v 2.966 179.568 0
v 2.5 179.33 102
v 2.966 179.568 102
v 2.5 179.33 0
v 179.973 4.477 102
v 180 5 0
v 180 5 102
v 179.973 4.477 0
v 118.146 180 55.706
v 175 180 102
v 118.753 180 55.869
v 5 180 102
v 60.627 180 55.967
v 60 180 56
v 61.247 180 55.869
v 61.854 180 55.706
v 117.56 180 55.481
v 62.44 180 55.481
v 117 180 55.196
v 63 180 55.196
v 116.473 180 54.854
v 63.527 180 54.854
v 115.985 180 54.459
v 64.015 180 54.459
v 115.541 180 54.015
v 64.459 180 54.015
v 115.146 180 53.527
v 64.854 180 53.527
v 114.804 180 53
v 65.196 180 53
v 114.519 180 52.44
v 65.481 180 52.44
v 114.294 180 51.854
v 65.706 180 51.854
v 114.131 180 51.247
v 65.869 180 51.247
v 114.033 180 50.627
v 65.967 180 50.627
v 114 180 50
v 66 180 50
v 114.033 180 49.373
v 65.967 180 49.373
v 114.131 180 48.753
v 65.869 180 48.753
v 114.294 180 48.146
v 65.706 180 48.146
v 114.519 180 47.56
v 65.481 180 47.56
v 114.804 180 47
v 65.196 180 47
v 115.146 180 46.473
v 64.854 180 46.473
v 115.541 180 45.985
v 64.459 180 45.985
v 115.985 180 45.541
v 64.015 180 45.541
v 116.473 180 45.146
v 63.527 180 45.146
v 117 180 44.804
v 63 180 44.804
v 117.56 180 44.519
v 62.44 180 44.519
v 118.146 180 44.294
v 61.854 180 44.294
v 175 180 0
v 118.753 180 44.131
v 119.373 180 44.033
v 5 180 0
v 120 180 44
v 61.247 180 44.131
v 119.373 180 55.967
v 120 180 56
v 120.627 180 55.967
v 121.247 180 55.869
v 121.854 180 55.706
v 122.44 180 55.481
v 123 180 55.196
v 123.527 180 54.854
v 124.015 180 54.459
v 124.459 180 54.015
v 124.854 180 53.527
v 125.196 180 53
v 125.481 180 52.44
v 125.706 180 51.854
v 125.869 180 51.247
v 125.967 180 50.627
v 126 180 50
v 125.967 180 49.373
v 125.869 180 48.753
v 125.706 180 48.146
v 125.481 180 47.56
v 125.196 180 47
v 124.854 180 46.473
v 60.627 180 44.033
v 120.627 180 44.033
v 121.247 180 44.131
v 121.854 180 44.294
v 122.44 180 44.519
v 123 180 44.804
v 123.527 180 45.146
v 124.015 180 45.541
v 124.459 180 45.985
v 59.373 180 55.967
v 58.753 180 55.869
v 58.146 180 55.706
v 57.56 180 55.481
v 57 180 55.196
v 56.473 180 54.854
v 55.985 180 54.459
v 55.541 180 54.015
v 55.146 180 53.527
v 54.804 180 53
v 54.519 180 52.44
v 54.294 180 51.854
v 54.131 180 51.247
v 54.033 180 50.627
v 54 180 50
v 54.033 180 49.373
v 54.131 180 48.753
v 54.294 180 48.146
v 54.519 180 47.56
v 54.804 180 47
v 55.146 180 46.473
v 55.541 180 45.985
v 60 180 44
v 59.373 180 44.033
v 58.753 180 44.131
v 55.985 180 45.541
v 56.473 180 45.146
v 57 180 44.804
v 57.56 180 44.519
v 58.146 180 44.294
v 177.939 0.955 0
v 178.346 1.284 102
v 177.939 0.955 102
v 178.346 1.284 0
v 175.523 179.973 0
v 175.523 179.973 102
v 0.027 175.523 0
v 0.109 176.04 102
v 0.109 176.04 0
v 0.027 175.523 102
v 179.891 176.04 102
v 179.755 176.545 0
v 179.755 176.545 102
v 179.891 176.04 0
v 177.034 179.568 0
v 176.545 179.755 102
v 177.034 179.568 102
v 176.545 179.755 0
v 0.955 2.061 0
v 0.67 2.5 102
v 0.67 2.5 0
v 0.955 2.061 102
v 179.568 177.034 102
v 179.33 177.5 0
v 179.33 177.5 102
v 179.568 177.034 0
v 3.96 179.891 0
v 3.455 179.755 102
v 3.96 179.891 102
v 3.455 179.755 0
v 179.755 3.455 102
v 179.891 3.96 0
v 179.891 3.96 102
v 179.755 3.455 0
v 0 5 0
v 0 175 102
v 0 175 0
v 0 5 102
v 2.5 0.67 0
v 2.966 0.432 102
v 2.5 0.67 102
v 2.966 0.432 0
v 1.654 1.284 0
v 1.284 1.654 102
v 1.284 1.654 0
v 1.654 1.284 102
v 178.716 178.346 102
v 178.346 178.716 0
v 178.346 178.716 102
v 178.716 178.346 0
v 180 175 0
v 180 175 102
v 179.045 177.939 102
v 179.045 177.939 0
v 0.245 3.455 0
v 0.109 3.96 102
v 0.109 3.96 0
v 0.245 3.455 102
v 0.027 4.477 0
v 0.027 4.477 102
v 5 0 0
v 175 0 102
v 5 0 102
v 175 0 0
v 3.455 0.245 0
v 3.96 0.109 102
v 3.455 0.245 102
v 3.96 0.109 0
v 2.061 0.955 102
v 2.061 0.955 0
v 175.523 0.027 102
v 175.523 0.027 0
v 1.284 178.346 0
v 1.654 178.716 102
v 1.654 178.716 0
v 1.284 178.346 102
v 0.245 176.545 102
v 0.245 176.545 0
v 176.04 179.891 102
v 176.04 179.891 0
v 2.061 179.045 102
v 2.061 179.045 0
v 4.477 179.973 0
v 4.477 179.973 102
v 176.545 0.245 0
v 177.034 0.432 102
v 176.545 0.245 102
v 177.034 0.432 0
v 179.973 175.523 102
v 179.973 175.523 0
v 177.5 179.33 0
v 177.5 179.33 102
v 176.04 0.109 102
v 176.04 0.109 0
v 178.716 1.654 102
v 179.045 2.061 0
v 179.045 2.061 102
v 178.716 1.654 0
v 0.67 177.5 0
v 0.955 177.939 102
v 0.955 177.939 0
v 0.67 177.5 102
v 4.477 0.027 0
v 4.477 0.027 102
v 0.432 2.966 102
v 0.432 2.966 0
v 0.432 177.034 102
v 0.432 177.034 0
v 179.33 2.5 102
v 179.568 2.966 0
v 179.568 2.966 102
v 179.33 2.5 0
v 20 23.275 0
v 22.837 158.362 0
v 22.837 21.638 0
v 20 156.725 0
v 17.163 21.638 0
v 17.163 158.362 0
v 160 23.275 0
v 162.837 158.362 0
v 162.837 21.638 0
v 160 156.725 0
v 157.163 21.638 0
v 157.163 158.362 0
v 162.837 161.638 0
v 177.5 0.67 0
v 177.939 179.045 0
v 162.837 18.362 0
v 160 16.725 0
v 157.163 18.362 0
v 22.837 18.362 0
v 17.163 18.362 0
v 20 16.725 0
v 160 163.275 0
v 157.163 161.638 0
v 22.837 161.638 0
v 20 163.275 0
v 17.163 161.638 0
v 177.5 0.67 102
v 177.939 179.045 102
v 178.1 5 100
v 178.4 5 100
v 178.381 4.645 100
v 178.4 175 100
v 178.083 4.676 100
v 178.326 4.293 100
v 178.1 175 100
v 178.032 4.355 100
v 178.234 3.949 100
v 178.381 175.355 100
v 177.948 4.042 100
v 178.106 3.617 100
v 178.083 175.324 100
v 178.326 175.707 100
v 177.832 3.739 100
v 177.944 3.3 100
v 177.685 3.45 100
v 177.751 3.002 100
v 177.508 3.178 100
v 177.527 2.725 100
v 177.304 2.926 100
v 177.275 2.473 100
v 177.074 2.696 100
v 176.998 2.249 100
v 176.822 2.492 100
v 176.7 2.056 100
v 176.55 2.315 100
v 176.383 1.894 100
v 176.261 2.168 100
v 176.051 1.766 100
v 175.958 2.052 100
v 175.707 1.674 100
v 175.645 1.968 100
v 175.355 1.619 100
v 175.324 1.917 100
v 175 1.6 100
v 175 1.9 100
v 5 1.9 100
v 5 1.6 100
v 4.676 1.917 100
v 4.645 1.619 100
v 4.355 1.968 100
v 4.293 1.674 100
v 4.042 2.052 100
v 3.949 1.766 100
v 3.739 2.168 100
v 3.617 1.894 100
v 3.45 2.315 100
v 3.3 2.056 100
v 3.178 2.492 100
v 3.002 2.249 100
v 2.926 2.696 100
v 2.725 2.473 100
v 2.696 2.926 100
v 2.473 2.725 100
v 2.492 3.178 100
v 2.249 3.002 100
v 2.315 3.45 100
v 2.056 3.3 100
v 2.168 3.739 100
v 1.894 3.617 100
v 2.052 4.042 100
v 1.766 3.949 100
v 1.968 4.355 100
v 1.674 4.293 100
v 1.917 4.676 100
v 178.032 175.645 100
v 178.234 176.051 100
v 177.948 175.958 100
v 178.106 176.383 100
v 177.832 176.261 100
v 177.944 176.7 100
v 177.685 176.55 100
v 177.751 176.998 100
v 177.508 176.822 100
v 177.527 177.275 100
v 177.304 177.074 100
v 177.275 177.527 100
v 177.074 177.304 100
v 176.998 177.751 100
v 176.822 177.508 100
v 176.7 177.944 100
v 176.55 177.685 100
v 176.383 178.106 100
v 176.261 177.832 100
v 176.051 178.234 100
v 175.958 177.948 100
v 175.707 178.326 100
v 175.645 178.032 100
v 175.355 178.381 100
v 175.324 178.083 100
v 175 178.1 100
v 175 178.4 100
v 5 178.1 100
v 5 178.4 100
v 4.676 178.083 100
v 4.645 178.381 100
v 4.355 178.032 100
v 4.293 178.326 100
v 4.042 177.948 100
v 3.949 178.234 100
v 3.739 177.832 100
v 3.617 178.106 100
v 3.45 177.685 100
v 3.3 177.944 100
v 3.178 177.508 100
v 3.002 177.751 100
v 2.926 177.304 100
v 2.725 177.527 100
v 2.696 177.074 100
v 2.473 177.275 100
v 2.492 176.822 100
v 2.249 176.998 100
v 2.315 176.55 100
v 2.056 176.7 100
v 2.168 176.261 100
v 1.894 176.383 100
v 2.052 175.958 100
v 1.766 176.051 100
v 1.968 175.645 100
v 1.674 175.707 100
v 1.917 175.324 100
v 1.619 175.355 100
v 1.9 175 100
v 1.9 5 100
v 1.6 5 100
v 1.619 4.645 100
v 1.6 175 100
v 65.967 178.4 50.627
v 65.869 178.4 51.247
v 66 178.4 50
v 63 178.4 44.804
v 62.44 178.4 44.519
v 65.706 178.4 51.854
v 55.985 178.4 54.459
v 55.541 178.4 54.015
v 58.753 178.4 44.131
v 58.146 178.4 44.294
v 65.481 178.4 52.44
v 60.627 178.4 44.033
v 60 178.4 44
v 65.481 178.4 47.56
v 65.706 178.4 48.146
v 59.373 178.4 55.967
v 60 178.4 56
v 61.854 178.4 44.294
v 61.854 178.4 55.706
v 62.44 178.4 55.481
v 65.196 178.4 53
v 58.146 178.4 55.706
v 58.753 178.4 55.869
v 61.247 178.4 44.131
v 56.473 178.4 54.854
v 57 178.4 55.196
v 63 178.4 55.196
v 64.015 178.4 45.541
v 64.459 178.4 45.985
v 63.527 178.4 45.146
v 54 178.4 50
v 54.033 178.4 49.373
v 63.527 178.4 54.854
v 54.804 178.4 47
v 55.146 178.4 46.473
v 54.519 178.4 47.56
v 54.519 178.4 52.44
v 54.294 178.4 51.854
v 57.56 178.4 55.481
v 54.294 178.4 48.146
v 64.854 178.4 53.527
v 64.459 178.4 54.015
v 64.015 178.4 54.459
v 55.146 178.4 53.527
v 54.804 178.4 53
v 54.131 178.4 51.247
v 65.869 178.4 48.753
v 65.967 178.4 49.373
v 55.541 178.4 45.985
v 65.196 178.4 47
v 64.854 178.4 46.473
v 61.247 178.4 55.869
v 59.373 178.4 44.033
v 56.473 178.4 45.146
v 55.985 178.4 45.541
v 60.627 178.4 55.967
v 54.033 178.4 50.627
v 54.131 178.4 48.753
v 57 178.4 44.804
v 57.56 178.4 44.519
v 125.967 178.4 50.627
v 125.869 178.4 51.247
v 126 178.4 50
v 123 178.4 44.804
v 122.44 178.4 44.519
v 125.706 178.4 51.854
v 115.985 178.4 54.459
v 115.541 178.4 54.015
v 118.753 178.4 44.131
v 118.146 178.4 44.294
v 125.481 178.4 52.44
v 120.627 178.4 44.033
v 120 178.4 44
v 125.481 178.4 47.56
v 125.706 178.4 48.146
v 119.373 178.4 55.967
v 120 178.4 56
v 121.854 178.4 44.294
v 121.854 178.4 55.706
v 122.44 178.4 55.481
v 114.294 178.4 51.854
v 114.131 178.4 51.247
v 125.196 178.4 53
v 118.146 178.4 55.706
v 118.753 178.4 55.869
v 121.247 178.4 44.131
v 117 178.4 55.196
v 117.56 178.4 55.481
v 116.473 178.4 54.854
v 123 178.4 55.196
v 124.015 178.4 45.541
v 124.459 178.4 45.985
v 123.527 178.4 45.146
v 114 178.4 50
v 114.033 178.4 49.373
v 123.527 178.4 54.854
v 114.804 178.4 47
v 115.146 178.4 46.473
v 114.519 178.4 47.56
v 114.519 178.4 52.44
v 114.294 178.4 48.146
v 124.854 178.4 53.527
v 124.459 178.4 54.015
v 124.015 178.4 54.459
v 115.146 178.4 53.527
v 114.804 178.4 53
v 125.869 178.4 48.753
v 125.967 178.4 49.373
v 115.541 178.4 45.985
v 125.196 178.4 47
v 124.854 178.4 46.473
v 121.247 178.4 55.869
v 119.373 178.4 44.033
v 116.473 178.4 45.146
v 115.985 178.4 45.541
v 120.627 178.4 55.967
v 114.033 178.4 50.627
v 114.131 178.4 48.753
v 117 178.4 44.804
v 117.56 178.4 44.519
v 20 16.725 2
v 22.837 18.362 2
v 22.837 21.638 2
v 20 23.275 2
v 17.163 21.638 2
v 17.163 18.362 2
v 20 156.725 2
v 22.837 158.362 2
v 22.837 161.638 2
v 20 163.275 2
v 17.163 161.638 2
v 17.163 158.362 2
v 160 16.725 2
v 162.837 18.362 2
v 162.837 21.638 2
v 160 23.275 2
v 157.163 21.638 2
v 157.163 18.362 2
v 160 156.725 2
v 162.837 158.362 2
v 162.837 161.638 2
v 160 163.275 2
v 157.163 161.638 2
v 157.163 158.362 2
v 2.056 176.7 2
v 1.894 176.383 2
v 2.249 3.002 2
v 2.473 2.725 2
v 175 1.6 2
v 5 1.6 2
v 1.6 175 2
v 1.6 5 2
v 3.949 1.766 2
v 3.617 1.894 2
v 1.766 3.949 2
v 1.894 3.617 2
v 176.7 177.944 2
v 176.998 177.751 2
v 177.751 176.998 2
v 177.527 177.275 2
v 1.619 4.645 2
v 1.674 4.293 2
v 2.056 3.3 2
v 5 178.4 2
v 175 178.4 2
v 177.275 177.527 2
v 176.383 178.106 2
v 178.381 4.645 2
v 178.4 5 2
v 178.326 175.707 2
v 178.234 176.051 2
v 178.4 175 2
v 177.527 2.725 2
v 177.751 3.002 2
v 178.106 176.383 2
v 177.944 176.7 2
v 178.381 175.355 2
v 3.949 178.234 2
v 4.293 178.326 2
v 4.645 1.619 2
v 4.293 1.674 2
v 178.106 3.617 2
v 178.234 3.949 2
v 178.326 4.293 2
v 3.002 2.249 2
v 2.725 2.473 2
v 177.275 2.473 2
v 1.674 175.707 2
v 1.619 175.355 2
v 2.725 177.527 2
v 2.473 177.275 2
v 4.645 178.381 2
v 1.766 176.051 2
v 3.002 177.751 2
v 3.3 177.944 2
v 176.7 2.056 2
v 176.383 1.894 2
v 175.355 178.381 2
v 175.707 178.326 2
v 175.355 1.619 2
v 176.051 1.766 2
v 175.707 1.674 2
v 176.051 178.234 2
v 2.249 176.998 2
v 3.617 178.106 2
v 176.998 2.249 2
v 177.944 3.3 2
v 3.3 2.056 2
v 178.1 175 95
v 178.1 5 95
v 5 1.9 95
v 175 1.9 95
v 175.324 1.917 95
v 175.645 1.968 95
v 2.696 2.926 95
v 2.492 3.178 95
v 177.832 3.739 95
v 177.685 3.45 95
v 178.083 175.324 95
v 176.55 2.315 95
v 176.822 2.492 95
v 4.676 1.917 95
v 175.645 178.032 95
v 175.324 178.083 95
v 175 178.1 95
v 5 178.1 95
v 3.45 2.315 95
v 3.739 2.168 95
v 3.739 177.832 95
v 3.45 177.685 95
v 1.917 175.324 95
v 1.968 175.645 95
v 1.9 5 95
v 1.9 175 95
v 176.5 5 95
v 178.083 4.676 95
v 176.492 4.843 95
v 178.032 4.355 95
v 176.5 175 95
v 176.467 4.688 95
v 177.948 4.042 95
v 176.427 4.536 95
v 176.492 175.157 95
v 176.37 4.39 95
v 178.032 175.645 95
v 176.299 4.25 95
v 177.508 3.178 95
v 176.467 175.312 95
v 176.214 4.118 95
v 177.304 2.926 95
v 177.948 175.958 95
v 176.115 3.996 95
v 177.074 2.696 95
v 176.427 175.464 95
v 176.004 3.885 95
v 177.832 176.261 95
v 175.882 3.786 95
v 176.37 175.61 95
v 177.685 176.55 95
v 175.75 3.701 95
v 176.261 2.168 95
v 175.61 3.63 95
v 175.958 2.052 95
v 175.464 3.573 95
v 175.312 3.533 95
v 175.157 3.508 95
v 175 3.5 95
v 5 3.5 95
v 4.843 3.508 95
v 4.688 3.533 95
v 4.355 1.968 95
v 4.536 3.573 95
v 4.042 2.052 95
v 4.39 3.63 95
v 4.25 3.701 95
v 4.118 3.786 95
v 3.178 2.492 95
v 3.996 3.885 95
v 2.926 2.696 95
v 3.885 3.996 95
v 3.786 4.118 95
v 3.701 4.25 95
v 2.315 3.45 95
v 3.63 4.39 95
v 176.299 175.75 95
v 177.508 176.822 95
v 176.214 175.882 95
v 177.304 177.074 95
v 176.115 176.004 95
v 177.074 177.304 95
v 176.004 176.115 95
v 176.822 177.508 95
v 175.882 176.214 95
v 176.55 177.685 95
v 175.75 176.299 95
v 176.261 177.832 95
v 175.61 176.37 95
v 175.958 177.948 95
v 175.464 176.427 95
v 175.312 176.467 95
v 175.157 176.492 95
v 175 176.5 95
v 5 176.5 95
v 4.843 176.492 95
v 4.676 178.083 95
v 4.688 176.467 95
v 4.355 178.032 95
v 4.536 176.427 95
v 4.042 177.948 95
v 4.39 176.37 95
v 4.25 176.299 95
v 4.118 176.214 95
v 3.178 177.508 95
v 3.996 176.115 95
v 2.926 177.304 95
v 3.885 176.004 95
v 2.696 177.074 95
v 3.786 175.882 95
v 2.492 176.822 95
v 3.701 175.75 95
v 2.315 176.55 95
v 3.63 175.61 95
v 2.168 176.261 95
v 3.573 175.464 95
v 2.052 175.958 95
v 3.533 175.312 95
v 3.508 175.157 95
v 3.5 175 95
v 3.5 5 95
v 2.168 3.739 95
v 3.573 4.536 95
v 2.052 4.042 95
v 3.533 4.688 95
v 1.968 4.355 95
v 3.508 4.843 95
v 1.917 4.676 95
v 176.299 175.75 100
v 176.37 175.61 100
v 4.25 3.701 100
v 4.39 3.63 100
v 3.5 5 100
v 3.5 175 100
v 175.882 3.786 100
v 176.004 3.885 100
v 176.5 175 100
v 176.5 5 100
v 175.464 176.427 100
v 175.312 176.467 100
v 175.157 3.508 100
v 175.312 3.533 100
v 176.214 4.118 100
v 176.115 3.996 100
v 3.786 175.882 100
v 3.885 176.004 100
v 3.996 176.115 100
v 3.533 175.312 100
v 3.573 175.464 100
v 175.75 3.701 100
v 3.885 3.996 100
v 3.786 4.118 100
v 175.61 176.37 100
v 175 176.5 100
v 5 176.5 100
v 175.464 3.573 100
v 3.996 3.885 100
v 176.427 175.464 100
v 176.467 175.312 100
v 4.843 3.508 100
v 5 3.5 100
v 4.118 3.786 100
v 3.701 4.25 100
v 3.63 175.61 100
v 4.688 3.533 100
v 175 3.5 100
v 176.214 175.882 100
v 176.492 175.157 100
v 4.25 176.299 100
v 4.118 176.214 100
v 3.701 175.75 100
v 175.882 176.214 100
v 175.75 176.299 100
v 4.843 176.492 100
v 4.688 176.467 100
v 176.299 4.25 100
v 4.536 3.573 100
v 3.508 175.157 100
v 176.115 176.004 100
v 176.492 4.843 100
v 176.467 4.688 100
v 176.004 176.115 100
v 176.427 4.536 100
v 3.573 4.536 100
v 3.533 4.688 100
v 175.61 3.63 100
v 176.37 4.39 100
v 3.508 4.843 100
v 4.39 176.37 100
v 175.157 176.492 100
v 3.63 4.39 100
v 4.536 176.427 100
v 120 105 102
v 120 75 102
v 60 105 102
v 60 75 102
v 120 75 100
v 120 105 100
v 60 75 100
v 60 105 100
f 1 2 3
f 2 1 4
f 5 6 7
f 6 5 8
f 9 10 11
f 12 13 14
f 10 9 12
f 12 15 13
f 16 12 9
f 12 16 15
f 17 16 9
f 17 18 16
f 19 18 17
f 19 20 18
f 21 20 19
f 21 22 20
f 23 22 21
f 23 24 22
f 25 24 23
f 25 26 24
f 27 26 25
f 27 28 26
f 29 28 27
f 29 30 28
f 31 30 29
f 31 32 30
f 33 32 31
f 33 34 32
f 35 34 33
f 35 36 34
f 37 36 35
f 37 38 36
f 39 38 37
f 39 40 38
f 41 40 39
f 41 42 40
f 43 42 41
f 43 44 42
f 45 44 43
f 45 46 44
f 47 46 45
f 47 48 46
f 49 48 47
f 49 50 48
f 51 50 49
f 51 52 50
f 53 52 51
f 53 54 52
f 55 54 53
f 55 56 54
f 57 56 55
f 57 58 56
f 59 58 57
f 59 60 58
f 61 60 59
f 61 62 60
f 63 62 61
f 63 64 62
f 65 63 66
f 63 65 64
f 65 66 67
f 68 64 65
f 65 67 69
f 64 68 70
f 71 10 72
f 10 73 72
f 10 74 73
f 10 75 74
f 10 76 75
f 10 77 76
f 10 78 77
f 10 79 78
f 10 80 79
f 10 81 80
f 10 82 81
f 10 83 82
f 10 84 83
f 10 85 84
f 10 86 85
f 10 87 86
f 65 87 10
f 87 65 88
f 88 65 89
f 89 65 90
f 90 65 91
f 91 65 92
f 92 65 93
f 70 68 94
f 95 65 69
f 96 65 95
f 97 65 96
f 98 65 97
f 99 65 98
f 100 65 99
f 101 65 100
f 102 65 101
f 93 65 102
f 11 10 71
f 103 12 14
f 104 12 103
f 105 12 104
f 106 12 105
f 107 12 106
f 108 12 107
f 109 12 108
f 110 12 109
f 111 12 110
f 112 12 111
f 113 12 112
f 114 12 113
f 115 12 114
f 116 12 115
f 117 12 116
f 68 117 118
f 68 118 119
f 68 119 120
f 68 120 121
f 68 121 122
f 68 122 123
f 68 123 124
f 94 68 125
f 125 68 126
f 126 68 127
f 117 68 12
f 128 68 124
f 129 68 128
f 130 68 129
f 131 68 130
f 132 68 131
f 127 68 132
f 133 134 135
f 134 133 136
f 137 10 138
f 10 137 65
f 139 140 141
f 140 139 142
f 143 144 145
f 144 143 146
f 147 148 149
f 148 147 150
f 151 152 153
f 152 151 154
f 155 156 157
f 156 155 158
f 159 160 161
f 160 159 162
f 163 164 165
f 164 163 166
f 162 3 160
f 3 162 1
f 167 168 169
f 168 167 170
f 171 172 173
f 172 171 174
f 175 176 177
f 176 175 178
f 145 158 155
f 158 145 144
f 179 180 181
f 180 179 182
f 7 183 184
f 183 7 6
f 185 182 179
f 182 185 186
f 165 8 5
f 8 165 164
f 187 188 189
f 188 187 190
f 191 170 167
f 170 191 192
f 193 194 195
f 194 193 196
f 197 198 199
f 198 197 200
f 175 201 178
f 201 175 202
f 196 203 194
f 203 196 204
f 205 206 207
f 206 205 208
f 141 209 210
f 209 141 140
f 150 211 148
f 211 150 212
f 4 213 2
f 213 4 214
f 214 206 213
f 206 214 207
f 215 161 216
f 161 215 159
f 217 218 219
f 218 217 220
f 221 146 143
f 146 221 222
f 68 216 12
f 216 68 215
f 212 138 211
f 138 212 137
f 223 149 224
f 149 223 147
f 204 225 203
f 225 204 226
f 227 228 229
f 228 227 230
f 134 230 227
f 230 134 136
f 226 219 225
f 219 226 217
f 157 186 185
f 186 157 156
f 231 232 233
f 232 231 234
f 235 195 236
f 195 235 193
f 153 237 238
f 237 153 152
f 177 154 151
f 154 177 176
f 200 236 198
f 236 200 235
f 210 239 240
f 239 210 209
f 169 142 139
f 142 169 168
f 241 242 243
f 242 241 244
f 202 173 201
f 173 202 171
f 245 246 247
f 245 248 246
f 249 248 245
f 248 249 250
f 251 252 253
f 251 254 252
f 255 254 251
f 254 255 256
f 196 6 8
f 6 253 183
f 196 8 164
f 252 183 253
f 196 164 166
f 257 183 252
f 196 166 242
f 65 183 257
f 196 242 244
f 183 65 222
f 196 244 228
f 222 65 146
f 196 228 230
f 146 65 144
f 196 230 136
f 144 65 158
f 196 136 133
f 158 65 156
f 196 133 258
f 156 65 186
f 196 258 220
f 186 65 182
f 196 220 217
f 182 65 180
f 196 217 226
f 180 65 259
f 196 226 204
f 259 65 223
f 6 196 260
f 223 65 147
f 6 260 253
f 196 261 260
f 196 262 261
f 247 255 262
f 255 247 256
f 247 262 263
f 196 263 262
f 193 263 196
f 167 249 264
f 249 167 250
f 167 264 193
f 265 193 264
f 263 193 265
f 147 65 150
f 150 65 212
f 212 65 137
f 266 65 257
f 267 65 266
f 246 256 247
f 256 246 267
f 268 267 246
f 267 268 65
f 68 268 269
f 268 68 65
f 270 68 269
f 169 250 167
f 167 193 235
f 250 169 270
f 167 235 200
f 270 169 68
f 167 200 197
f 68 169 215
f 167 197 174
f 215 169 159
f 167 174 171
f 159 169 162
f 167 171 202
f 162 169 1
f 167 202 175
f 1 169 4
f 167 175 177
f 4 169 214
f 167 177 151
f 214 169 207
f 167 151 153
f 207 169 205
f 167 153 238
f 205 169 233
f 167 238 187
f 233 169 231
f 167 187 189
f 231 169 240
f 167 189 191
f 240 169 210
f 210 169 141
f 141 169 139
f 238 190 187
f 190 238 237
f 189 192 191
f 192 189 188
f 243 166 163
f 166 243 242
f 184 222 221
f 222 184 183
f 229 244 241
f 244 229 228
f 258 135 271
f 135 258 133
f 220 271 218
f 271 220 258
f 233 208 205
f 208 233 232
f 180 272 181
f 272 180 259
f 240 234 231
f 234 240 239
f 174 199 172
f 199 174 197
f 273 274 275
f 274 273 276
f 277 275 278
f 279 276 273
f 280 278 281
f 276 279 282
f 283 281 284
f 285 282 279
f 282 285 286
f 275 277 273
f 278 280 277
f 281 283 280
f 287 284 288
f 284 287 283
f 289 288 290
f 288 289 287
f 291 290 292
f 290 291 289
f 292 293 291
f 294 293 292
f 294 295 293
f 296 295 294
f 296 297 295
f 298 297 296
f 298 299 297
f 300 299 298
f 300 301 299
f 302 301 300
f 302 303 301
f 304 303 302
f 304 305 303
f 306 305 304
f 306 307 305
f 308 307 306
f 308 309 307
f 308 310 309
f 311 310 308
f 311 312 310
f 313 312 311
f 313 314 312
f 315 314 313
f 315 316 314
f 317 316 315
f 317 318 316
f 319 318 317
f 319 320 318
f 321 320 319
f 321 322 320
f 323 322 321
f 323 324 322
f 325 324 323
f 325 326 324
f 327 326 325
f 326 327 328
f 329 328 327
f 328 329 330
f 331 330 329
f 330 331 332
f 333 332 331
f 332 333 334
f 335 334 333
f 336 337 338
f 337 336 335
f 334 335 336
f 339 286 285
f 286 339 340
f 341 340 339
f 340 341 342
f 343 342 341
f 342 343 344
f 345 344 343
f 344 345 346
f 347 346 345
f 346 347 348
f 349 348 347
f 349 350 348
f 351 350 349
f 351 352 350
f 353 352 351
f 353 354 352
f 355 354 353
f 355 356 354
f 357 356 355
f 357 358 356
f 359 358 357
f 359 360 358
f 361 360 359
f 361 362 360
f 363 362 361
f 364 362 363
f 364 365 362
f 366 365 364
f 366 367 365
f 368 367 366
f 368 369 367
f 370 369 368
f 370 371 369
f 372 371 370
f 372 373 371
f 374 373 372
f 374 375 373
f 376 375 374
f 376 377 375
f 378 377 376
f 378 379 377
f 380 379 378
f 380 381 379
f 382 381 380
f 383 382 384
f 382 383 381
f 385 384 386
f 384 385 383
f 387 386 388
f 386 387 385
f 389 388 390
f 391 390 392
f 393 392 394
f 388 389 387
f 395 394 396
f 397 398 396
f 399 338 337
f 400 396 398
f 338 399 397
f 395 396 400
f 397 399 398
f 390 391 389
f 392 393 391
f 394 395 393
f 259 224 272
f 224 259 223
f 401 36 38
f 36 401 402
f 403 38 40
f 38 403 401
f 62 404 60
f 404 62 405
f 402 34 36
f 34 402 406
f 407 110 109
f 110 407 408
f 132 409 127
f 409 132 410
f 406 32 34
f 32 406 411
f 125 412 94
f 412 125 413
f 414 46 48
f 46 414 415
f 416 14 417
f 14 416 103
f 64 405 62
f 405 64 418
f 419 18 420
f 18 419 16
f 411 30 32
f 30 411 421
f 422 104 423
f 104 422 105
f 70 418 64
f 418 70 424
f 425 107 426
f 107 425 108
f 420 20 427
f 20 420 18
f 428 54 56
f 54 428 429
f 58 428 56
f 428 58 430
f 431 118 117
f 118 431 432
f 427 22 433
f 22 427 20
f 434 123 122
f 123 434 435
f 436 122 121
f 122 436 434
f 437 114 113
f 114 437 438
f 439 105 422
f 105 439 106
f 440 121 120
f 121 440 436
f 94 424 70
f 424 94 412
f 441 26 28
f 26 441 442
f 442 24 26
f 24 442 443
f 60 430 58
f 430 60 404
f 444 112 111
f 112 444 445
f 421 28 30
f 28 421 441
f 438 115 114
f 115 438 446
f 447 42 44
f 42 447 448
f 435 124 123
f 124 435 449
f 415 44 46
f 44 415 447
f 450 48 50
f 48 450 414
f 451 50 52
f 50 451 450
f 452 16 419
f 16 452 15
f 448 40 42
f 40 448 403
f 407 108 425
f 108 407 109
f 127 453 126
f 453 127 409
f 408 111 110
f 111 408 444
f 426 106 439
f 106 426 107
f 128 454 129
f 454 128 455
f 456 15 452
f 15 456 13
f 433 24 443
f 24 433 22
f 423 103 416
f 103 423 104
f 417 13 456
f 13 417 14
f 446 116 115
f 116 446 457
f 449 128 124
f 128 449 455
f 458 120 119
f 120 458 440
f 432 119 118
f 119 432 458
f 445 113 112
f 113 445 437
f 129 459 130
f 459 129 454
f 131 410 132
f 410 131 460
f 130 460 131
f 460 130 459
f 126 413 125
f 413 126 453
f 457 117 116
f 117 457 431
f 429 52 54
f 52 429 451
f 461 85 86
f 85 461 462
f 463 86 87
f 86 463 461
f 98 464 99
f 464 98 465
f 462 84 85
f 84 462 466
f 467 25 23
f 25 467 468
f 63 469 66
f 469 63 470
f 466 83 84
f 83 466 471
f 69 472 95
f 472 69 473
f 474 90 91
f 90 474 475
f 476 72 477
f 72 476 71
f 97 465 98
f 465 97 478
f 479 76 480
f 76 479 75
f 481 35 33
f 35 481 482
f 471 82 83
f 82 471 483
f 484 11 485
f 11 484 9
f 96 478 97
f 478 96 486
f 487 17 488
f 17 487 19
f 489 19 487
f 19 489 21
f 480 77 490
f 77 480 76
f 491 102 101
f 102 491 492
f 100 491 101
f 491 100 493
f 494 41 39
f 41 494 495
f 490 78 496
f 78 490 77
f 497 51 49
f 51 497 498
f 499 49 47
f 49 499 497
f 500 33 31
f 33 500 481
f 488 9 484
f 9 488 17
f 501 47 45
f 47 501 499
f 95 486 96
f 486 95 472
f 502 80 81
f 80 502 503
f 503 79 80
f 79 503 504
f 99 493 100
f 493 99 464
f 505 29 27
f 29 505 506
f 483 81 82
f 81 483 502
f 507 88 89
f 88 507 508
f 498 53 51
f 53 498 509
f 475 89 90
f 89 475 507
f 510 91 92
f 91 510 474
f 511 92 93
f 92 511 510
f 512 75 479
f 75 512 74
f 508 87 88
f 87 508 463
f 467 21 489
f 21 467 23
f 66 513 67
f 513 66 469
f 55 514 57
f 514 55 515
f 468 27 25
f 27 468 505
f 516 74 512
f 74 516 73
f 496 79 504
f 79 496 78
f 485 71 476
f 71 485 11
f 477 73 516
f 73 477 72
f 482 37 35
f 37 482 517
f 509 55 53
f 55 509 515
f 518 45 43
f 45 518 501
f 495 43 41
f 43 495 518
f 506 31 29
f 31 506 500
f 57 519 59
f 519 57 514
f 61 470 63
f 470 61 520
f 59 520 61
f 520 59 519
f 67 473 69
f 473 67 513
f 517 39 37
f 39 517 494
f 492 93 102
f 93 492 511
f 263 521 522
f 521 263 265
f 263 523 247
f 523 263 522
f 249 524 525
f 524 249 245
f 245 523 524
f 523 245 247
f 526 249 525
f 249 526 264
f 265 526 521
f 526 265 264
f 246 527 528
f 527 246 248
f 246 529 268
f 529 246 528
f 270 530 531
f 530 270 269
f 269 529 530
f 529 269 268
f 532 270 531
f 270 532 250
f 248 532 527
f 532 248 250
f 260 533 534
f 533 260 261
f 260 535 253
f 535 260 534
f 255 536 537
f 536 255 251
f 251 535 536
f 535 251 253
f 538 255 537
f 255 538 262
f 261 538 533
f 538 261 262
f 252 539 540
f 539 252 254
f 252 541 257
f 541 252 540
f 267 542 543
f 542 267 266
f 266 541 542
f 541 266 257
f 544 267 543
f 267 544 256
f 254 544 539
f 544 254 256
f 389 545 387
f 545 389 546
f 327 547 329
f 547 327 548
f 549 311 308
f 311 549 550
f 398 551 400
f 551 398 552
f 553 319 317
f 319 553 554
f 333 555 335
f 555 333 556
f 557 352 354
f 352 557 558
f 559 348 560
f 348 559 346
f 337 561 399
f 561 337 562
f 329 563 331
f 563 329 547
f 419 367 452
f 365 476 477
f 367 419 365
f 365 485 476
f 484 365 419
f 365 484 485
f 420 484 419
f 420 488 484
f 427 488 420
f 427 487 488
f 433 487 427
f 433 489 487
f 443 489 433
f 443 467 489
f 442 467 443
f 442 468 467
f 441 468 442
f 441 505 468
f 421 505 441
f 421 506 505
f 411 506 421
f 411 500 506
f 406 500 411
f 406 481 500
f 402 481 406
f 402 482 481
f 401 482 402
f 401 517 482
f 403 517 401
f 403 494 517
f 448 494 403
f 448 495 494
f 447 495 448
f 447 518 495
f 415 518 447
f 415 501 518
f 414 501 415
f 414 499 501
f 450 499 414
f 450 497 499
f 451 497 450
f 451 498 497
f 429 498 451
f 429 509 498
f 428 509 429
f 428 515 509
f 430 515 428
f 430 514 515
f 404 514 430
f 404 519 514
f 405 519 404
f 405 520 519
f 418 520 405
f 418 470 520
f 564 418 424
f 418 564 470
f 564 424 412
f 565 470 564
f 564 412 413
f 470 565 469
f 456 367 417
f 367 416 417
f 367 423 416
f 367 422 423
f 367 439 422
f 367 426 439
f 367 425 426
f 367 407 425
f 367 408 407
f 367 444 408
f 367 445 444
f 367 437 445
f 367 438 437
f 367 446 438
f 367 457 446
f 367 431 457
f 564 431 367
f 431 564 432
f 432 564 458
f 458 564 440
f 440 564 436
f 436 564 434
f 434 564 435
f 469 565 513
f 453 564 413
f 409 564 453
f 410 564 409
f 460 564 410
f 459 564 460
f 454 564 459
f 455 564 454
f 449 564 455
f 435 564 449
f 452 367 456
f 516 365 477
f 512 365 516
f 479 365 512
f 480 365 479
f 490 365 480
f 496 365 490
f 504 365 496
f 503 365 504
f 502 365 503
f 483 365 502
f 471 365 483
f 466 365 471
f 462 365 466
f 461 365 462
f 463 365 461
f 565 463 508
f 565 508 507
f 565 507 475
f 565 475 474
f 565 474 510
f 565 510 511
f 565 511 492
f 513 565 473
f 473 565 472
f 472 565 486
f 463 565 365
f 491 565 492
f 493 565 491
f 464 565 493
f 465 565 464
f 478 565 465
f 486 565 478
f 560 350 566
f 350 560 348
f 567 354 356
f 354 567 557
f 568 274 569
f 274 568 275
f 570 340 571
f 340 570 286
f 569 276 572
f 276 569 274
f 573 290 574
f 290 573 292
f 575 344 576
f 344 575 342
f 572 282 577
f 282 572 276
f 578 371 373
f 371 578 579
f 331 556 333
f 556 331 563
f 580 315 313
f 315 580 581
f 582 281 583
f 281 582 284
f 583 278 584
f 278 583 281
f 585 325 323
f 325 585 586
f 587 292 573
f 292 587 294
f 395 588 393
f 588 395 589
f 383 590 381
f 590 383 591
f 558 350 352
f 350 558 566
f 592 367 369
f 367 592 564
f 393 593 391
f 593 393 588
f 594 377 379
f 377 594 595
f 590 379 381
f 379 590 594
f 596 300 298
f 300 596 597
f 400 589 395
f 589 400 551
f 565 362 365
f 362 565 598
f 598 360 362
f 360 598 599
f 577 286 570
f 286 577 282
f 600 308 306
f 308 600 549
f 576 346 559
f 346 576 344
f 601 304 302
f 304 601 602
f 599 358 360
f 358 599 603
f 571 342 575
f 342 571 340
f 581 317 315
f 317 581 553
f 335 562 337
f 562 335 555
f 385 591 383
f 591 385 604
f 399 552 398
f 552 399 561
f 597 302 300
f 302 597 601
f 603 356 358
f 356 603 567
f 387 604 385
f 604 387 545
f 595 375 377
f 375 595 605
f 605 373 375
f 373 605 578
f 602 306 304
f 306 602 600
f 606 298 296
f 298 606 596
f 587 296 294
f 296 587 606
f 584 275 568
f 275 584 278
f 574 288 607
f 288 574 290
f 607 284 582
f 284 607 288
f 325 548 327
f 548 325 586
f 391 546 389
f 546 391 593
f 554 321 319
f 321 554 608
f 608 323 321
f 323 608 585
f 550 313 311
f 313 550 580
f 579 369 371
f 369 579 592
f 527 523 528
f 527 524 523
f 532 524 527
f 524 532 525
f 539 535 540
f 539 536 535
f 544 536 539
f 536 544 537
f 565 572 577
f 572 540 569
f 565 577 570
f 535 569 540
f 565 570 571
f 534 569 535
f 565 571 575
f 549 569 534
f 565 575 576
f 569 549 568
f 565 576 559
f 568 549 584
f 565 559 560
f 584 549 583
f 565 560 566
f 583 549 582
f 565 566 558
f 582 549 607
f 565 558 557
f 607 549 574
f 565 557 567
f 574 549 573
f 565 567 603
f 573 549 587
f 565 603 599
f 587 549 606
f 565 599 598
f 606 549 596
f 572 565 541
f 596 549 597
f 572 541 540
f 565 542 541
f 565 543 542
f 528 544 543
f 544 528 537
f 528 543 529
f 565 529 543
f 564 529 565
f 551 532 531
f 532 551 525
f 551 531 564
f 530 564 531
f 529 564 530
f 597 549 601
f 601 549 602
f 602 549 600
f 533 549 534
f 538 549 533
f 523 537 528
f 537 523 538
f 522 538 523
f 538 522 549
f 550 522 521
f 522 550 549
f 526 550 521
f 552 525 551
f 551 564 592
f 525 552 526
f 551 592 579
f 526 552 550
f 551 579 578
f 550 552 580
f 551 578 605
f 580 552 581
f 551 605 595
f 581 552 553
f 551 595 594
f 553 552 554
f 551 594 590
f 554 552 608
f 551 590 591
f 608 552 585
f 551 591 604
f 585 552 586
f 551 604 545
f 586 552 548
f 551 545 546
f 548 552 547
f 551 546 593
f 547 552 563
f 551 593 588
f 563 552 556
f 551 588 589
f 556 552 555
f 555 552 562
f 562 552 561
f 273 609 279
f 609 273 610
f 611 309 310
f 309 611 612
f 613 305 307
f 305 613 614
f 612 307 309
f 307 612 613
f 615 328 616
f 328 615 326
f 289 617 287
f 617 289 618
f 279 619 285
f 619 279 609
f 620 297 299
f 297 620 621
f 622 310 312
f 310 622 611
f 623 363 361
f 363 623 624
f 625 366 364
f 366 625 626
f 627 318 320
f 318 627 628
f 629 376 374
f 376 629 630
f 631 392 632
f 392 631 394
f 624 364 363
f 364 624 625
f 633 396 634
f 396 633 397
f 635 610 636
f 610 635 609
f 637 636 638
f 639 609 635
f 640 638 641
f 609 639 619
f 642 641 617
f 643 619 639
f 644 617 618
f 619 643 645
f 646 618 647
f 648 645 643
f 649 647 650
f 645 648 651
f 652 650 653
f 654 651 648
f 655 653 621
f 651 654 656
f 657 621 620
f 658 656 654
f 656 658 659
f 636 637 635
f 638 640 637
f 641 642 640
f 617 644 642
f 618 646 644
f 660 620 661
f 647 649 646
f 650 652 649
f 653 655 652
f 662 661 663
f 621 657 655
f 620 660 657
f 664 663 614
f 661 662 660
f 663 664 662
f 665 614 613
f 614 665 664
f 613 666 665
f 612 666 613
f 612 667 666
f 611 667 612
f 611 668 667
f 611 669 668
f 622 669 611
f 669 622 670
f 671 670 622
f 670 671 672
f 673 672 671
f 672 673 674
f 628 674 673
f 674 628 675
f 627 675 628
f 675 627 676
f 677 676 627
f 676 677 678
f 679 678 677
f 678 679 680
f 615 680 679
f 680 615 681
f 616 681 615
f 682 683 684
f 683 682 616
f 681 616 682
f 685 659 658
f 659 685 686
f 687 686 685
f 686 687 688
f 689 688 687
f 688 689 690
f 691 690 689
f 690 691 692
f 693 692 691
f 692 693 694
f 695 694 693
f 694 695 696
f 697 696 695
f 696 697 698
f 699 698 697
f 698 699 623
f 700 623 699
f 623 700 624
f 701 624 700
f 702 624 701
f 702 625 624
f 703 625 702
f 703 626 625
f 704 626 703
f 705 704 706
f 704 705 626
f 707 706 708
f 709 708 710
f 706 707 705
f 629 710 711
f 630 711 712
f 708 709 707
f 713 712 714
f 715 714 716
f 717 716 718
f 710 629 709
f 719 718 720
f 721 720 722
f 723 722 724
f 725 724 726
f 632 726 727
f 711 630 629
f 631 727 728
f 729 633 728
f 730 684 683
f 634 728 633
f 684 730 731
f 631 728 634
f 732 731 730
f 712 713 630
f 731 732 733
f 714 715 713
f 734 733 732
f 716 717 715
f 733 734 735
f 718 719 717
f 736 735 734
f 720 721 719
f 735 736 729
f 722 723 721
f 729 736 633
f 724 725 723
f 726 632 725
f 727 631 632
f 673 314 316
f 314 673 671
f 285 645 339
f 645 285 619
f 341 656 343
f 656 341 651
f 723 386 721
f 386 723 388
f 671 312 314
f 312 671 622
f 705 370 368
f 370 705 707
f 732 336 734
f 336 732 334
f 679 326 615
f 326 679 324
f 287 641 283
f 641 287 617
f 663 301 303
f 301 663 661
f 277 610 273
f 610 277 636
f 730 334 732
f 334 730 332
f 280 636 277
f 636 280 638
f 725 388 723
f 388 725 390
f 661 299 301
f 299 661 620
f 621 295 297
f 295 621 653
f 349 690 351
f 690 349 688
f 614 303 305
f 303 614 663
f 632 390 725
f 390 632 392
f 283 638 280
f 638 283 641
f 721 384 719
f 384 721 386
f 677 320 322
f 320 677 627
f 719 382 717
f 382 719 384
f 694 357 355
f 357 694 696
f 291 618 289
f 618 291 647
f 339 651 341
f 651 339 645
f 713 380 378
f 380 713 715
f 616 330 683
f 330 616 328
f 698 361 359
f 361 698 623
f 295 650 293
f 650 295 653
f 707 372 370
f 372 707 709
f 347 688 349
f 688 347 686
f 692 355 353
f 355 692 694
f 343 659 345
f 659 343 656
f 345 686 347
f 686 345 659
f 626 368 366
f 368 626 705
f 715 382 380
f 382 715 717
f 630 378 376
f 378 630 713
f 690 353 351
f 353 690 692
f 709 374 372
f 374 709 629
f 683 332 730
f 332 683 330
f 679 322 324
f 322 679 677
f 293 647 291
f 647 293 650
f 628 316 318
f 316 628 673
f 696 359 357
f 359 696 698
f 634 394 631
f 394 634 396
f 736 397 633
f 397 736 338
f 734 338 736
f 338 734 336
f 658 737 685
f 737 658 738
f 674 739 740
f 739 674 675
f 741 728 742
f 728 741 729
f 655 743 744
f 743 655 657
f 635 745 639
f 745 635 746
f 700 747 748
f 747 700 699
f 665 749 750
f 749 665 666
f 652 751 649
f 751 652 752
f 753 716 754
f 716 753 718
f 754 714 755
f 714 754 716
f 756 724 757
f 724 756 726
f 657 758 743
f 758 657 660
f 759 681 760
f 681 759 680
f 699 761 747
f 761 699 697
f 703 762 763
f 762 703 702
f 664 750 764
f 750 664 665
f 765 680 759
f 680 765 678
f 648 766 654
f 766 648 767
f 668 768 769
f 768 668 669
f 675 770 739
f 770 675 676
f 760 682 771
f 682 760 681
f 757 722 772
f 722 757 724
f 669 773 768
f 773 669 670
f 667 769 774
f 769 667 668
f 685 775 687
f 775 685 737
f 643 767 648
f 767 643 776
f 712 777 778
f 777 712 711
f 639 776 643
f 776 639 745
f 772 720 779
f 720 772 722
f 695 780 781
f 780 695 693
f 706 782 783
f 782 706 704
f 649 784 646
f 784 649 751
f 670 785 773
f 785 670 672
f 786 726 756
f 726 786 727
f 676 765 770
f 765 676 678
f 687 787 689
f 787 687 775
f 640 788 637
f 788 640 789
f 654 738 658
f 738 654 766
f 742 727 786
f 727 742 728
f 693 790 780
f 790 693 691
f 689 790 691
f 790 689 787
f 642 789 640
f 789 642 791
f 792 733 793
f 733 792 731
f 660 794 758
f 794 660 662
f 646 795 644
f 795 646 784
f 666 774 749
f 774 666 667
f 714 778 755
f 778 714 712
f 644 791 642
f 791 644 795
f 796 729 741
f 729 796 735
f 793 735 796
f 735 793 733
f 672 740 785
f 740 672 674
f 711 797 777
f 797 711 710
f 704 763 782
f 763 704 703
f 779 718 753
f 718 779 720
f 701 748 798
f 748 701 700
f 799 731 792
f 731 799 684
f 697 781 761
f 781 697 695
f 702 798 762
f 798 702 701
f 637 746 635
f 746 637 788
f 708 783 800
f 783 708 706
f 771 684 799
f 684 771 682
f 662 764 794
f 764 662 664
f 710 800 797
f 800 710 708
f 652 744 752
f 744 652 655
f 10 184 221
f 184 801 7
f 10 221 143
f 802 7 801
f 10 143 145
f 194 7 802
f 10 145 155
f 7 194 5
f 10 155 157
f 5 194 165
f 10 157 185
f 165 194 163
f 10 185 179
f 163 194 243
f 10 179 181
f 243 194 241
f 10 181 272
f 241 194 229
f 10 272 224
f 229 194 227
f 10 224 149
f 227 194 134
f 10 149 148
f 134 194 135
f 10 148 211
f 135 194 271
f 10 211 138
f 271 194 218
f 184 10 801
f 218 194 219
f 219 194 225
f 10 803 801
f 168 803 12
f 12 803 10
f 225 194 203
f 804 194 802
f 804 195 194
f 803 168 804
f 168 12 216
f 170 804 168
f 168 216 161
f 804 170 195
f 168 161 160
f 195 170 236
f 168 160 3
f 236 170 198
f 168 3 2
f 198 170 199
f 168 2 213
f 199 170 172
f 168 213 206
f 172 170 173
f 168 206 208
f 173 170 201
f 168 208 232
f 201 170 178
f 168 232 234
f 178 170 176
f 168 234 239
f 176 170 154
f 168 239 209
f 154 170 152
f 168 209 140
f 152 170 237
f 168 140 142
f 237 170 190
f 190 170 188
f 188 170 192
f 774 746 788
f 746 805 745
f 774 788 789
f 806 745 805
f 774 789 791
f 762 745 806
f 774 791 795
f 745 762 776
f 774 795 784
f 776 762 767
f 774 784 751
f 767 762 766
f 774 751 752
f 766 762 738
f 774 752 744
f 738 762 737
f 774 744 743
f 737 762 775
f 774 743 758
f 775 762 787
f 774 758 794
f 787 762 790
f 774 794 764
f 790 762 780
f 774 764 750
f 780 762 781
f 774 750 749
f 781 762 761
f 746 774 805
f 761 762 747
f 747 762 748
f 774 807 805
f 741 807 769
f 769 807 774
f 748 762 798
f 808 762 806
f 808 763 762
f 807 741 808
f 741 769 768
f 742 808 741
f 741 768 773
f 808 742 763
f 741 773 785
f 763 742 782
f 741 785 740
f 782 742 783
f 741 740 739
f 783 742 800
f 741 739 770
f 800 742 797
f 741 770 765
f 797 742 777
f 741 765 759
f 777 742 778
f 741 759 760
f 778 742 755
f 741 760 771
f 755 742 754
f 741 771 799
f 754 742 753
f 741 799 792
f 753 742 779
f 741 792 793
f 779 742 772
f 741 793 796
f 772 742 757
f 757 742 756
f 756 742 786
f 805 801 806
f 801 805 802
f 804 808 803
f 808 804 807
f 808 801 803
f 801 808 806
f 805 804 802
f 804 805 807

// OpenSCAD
// file: params.scad
// ============================================
// fiberfeel-rig 共通パラメータ
// ============================================

// --- ファイバー ---
// 三菱レイヨン エスカ CK-40E1 (PMMA SI POF, 1.0mm OD)
pof_diameter_mm = 1.0;
pof_clearance_mm = 0.2;                       // 印刷誤差吸収
pof_channel_width_mm = pof_diameter_mm + pof_clearance_mm;
pof_channel_depth_mm = pof_diameter_mm * 0.7; // 上面はゲル接触可能に

// --- LED カプラ専用：縦穴の収縮余裕 ---
pof_channel_width_led_side_mm = 1.8;  // 縦穴専用、収縮余裕大（実機検証で 1.5 → 1.8 に拡大）

// --- 曲げ半径 ---
bend_radius_mm = 10.0;
bend_straight_run_mm = 30;                    // 曲げ部前後の直線部長さ

// --- LED ---
led_diameter_mm = 5.1;                        // 5mm砲弾型 + クリアランス
led_body_depth_mm = 8.0;                      // LED本体（リード除く）の埋め込み深さ
led_lead_clearance_mm = 5.0;                  // リード逃げの空間

// --- ゲル/PDMS パッド ---
pad_size_mm = 30;                             // 30 x 30 mm
pad_thickness_mm = 3;                         // 3 mm 厚
mold_wall_mm = 4;
mold_floor_mm = 3;
mold_taper_deg = 1;                           // 抜き勾配

// --- 錘ガイド ---
weight_pad_outer_mm = 35;
weight_recess_diameter_mm = 25;
weight_recess_depth_mm = 5;

// --- カメラカプラ ---
// Pi HQ Camera M12 ボディ寸法
hq_body_width_mm = 38;
hq_body_height_mm = 38;
hq_body_depth_mm = 19;
camera_to_fiber_distance_mm = 70;             // 暫定、Phase 0 で調整
fiber_arm_slot_length_mm = 40;                // ±20mm の調整代

// --- HQ Camera 取り付け穴 ---
// Robosheep 実機合わせ：30×30mm 正方ピッチ、M2.5 通し穴 d=3.1（印刷収縮余裕込み）
hq_mount_pitch_mm = 30.0;       // M2.5 穴の縦・横ピッチ（実測値）
hq_mount_hole_d_mm = 3.1;       // M2.5 通し穴径（クリアランス＋印刷収縮余裕込み）
hq_mount_offset_mm = 6.25;      // PCB エッジから穴中心

// --- 遮光ボックス ---
enclosure_outer_x_mm = 180;
enclosure_outer_y_mm = 180;
enclosure_outer_z_mm = 100;
enclosure_wall_mm = 1.6;          // 壁厚（4 perimeters @ 0.4mm nozzle）
enclosure_floor_mm = 2.0;         // 底厚
enclosure_lid_thickness_mm = 2.0; // 蓋の厚さ
enclosure_lid_lip_mm = 5.0;       // 蓋の被せ深さ
enclosure_lid_clearance_mm = 0.3; // 蓋と本体の遊び

// ケーブル通し穴（迷光対策で L 字パス）
cable_pass_diameter_mm = 12;      // ケーブル束を通す穴径
cable_pass_count = 2;             // 必要な穴数（FFC + 電源）

// --- 共通 ---
default_wall_mm = 2.0;
$fn = 60;
// main file
// ============================================
// enclosure.scad
// 180 × 180 × 100 mm 遮光ボックス本体 + 蓋。
// 後ろ壁にケーブル通し穴 ×2、内部にバッフル板で迷光遮蔽。
// 底面 4 隅に M3 ナットトラップ（ベース板固定用）。
// 蓋は外周にぴったり乗り、内側 lip でラビリンス遮光。
//
// 印刷向き：本体・蓋とも開口部を上にしてプリント（サポート不要）。
// 別 STL として出力するため display_mode を切り替えてエクスポート。
// ============================================

include <params.scad>

// ----------------------------------------------------------------
// 表示モード（OpenSCAD レンダ・STL エクスポート用）
//   0: 本体のみ → enclosure_body.stl
//   1: 蓋のみ   → enclosure_lid.stl
//   2: 両方を組み立て表示（外観確認用、エクスポートには使わない）
// ----------------------------------------------------------------
display_mode = 2;

// ----------------------------------------------------------------
// 派生定数
// ----------------------------------------------------------------
eps                = 0.01;
corner_r           = 5;                       // 外形角丸半径
floor_z            = enclosure_floor_mm;      // 床上面の z
cavity_top_z       = enclosure_outer_z_mm;    // 主キャビティ上端 = 壁上端

// ナットトラップ寸法（M3、底側から挿入）
m3_clearance_d     = 3.4;
m3_nut_flat_to_flat = 5.5;
m3_nut_pocket_d    = m3_nut_flat_to_flat / cos(30) + 0.2;  // 外接円径（hex の頂点間）+ 印刷余裕
m3_nut_pocket_h    = 2.4;
nut_inset          = 20;                      // 4 隅から内側へ
// 底厚 (2.0) より深い (2.4) ナットポケットを完全に閉じるため、
// ポケット直上に小ボスを追加して天面を確保する。
nut_boss_d         = 12;
nut_boss_h         = max(m3_nut_pocket_h - floor_z + 0.6, 0.6);  // = 1.0mm

// ケーブル通し穴 + バッフル板
cable_z_center     = enclosure_outer_z_mm * 0.5;   // 壁高さ中央 (= 50)
cable_x_spacing    = 60;                            // 2 穴の中心間距離
baffle_thickness   = 1.6;
baffle_w           = 20;
baffle_h           = 30;
baffle_offset_in   = 5;                             // 穴の前 5mm 内側

// 蓋 lip
lid_lip_thickness  = enclosure_wall_mm;             // 凸枠の径方向厚み

// 蓋取手凹み
handle_w           = 60;
handle_h           = 30;
handle_d           = 3;

// ----------------------------------------------------------------
// ヘルパ：角丸ボックス
//   底面 z=0 から高さ z、底面サイズ x×y、角丸半径 r。
// ----------------------------------------------------------------
module rounded_box(x, y, z, r) {
    // 4 隅シリンダの hull で角丸プリズムを作る。r は x/2, y/2 未満を要求。
    rr = max(r, 0.01);
    hull() {
        for (xi = [rr, x - rr])
            for (yi = [rr, y - rr])
                translate([xi, yi, 0])
                    cylinder(r = rr, h = z);
    }
}

// ----------------------------------------------------------------
// (1) ボックス本体
// ----------------------------------------------------------------
// 構造：
//   - 外形 enclosure_outer_x_mm × y × z の角丸ブロック
//   - 床厚 enclosure_floor_mm、壁厚 enclosure_wall_mm の上面開放キャビティ
//   - 後ろ壁 (+Y) にケーブル通し穴 2 つ、内側にバッフル板で直線光遮蔽
//   - 底面 4 隅にナットトラップ（M3、底側から）+ クリアランス穴
//
// 蓋の段差について（実装メモ）：
//   仕様の "外周から (wall + clearance) 内側に深さ lid_lip mm の段差リムを彫る"
//   を文字通り解釈すると壁厚 (1.6) を超える内寄せ (1.9) となり壁が消失するため、
//   ここでは「壁上面を蓋外周の支えとして用い、蓋 lip がキャビティ内に降りる
//   ラビリンス構造」として実装した。蓋外周は本体外周にぴったり一致し、
//   lip は壁内面と clearance (0.3mm) の隙間でスライドする（後述の lid 参照）。
// ----------------------------------------------------------------
module enclosure_body() {
    difference() {
        union() {
            // 外形（角丸プリズム）
            rounded_box(
                enclosure_outer_x_mm,
                enclosure_outer_y_mm,
                enclosure_outer_z_mm,
                corner_r
            );

            // ナットトラップ補強ボス（床上面に追加）
            for (xi = [nut_inset, enclosure_outer_x_mm - nut_inset])
                for (yi = [nut_inset, enclosure_outer_y_mm - nut_inset])
                    translate([xi, yi, floor_z])
                        cylinder(d = nut_boss_d, h = nut_boss_h);

            // バッフル板（後ろ壁側、ケーブル穴の前）
            for (i = [0 : cable_pass_count - 1]) {
                cx = enclosure_outer_x_mm / 2
                     + (i - (cable_pass_count - 1) / 2) * cable_x_spacing;
                translate([
                    cx - baffle_w / 2,
                    enclosure_outer_y_mm - enclosure_wall_mm
                        - baffle_offset_in - baffle_thickness,
                    floor_z
                ])
                    cube([baffle_w, baffle_thickness, baffle_h]);
            }
        }

        // 主キャビティ（上面開放）
        translate([enclosure_wall_mm, enclosure_wall_mm, floor_z])
            rounded_box(
                enclosure_outer_x_mm - 2 * enclosure_wall_mm,
                enclosure_outer_y_mm - 2 * enclosure_wall_mm,
                cavity_top_z - floor_z + eps,
                max(corner_r - enclosure_wall_mm, 0.5)
            );

        // ケーブル通し穴（後ろ壁 +Y 側、X 方向に並んだ 2 穴）
        for (i = [0 : cable_pass_count - 1]) {
            cx = enclosure_outer_x_mm / 2
                 + (i - (cable_pass_count - 1) / 2) * cable_x_spacing;
            translate([cx, enclosure_outer_y_mm + eps, cable_z_center])
                rotate([90, 0, 0])
                    cylinder(
                        d = cable_pass_diameter_mm,
                        h = enclosure_wall_mm + 2 * eps
                    );
        }

        // M3 ネジ通し穴（底面貫通、4 隅）
        for (xi = [nut_inset, enclosure_outer_x_mm - nut_inset])
            for (yi = [nut_inset, enclosure_outer_y_mm - nut_inset])
                translate([xi, yi, -eps])
                    cylinder(
                        d = m3_clearance_d,
                        h = floor_z + nut_boss_h + 2 * eps
                    );

        // M3 ナットポケット（底側から、6 角形 2.4mm 深さ）
        for (xi = [nut_inset, enclosure_outer_x_mm - nut_inset])
            for (yi = [nut_inset, enclosure_outer_y_mm - nut_inset])
                translate([xi, yi, -eps])
                    rotate([0, 0, 30])  // フラット面を X/Y 軸に揃える
                        cylinder(
                            d = m3_nut_pocket_d,
                            h = m3_nut_pocket_h + eps,
                            $fn = 6
                        );
    }
}

// ----------------------------------------------------------------
// (2) 蓋
// ----------------------------------------------------------------
// 構造（蓋座標、底面 z=0、上面 z=lid_thickness、lip は z=-lid_lip..0）：
//   - メインプレート：外形 outer_x × outer_y × lid_thickness
//   - 下面 lip：外周から (wall + clearance) 内側に lid_lip 高さの凸枠
//     （内側に肉を残さず枠状の中空構造）
// 蓋全体の Z 寸法 = lid_thickness + lid_lip = 7mm。
//
// 嵌合：
//   - 蓋の外周は本体外周と一致（外光が漏れない）
//   - lip 外面は本体キャビティ壁から clearance (0.3mm) 離れてスライド
//   - lip 高さ分のラビリンスで直線光を遮断
// ----------------------------------------------------------------
module enclosure_lid() {
    // 蓋座標：メインプレート底面が z=0、上面が z=lid_thickness。
    // lip はメインプレートの下に伸びる（z=-lid_lip..0）。
    difference() {
        union() {
            // メインプレート
            rounded_box(
                enclosure_outer_x_mm,
                enclosure_outer_y_mm,
                enclosure_lid_thickness_mm,
                corner_r
            );

            // lip（下方向に張り出す凸枠）
            translate([
                enclosure_wall_mm + enclosure_lid_clearance_mm,
                enclosure_wall_mm + enclosure_lid_clearance_mm,
                -enclosure_lid_lip_mm
            ])
                difference() {
                    // lip 外形
                    rounded_box(
                        enclosure_outer_x_mm
                            - 2 * (enclosure_wall_mm + enclosure_lid_clearance_mm),
                        enclosure_outer_y_mm
                            - 2 * (enclosure_wall_mm + enclosure_lid_clearance_mm),
                        enclosure_lid_lip_mm + eps,
                        max(corner_r - enclosure_wall_mm
                            - enclosure_lid_clearance_mm, 0.5)
                    );
                    // 中空（lip は枠形状）
                    translate([lid_lip_thickness, lid_lip_thickness, -eps])
                        rounded_box(
                            enclosure_outer_x_mm
                                - 2 * (enclosure_wall_mm
                                       + enclosure_lid_clearance_mm
                                       + lid_lip_thickness),
                            enclosure_outer_y_mm
                                - 2 * (enclosure_wall_mm
                                       + enclosure_lid_clearance_mm
                                       + lid_lip_thickness),
                            enclosure_lid_lip_mm + 3 * eps,
                            max(corner_r - enclosure_wall_mm
                                - enclosure_lid_clearance_mm
                                - lid_lip_thickness, 0.5)
                        );
                }
        }

        // 上面の取手凹み（中心配置、深さ handle_d）
        translate([
            (enclosure_outer_x_mm - handle_w) / 2,
            (enclosure_outer_y_mm - handle_h) / 2,
            enclosure_lid_thickness_mm - handle_d
        ])
            cube([handle_w, handle_h, handle_d + eps]);
    }
}

// ----------------------------------------------------------------
// (3) 表示／エクスポート
// ----------------------------------------------------------------
if (display_mode == 0) {
    enclosure_body();
} else if (display_mode == 1) {
    // 蓋の lip が下を向くよう lid_lip 分だけ上方に持ち上げて表示
    translate([0, 0, enclosure_lid_lip_mm])
        enclosure_lid();
} else {
    // 組立表示：蓋を本体上に乗せた高さに配置
    // 蓋座標原点（メインプレート底面）が z = enclosure_outer_z_mm に来るよう平行移動
    enclosure_body();
    translate([0, 0, enclosure_outer_z_mm])
        enclosure_lid();
}
